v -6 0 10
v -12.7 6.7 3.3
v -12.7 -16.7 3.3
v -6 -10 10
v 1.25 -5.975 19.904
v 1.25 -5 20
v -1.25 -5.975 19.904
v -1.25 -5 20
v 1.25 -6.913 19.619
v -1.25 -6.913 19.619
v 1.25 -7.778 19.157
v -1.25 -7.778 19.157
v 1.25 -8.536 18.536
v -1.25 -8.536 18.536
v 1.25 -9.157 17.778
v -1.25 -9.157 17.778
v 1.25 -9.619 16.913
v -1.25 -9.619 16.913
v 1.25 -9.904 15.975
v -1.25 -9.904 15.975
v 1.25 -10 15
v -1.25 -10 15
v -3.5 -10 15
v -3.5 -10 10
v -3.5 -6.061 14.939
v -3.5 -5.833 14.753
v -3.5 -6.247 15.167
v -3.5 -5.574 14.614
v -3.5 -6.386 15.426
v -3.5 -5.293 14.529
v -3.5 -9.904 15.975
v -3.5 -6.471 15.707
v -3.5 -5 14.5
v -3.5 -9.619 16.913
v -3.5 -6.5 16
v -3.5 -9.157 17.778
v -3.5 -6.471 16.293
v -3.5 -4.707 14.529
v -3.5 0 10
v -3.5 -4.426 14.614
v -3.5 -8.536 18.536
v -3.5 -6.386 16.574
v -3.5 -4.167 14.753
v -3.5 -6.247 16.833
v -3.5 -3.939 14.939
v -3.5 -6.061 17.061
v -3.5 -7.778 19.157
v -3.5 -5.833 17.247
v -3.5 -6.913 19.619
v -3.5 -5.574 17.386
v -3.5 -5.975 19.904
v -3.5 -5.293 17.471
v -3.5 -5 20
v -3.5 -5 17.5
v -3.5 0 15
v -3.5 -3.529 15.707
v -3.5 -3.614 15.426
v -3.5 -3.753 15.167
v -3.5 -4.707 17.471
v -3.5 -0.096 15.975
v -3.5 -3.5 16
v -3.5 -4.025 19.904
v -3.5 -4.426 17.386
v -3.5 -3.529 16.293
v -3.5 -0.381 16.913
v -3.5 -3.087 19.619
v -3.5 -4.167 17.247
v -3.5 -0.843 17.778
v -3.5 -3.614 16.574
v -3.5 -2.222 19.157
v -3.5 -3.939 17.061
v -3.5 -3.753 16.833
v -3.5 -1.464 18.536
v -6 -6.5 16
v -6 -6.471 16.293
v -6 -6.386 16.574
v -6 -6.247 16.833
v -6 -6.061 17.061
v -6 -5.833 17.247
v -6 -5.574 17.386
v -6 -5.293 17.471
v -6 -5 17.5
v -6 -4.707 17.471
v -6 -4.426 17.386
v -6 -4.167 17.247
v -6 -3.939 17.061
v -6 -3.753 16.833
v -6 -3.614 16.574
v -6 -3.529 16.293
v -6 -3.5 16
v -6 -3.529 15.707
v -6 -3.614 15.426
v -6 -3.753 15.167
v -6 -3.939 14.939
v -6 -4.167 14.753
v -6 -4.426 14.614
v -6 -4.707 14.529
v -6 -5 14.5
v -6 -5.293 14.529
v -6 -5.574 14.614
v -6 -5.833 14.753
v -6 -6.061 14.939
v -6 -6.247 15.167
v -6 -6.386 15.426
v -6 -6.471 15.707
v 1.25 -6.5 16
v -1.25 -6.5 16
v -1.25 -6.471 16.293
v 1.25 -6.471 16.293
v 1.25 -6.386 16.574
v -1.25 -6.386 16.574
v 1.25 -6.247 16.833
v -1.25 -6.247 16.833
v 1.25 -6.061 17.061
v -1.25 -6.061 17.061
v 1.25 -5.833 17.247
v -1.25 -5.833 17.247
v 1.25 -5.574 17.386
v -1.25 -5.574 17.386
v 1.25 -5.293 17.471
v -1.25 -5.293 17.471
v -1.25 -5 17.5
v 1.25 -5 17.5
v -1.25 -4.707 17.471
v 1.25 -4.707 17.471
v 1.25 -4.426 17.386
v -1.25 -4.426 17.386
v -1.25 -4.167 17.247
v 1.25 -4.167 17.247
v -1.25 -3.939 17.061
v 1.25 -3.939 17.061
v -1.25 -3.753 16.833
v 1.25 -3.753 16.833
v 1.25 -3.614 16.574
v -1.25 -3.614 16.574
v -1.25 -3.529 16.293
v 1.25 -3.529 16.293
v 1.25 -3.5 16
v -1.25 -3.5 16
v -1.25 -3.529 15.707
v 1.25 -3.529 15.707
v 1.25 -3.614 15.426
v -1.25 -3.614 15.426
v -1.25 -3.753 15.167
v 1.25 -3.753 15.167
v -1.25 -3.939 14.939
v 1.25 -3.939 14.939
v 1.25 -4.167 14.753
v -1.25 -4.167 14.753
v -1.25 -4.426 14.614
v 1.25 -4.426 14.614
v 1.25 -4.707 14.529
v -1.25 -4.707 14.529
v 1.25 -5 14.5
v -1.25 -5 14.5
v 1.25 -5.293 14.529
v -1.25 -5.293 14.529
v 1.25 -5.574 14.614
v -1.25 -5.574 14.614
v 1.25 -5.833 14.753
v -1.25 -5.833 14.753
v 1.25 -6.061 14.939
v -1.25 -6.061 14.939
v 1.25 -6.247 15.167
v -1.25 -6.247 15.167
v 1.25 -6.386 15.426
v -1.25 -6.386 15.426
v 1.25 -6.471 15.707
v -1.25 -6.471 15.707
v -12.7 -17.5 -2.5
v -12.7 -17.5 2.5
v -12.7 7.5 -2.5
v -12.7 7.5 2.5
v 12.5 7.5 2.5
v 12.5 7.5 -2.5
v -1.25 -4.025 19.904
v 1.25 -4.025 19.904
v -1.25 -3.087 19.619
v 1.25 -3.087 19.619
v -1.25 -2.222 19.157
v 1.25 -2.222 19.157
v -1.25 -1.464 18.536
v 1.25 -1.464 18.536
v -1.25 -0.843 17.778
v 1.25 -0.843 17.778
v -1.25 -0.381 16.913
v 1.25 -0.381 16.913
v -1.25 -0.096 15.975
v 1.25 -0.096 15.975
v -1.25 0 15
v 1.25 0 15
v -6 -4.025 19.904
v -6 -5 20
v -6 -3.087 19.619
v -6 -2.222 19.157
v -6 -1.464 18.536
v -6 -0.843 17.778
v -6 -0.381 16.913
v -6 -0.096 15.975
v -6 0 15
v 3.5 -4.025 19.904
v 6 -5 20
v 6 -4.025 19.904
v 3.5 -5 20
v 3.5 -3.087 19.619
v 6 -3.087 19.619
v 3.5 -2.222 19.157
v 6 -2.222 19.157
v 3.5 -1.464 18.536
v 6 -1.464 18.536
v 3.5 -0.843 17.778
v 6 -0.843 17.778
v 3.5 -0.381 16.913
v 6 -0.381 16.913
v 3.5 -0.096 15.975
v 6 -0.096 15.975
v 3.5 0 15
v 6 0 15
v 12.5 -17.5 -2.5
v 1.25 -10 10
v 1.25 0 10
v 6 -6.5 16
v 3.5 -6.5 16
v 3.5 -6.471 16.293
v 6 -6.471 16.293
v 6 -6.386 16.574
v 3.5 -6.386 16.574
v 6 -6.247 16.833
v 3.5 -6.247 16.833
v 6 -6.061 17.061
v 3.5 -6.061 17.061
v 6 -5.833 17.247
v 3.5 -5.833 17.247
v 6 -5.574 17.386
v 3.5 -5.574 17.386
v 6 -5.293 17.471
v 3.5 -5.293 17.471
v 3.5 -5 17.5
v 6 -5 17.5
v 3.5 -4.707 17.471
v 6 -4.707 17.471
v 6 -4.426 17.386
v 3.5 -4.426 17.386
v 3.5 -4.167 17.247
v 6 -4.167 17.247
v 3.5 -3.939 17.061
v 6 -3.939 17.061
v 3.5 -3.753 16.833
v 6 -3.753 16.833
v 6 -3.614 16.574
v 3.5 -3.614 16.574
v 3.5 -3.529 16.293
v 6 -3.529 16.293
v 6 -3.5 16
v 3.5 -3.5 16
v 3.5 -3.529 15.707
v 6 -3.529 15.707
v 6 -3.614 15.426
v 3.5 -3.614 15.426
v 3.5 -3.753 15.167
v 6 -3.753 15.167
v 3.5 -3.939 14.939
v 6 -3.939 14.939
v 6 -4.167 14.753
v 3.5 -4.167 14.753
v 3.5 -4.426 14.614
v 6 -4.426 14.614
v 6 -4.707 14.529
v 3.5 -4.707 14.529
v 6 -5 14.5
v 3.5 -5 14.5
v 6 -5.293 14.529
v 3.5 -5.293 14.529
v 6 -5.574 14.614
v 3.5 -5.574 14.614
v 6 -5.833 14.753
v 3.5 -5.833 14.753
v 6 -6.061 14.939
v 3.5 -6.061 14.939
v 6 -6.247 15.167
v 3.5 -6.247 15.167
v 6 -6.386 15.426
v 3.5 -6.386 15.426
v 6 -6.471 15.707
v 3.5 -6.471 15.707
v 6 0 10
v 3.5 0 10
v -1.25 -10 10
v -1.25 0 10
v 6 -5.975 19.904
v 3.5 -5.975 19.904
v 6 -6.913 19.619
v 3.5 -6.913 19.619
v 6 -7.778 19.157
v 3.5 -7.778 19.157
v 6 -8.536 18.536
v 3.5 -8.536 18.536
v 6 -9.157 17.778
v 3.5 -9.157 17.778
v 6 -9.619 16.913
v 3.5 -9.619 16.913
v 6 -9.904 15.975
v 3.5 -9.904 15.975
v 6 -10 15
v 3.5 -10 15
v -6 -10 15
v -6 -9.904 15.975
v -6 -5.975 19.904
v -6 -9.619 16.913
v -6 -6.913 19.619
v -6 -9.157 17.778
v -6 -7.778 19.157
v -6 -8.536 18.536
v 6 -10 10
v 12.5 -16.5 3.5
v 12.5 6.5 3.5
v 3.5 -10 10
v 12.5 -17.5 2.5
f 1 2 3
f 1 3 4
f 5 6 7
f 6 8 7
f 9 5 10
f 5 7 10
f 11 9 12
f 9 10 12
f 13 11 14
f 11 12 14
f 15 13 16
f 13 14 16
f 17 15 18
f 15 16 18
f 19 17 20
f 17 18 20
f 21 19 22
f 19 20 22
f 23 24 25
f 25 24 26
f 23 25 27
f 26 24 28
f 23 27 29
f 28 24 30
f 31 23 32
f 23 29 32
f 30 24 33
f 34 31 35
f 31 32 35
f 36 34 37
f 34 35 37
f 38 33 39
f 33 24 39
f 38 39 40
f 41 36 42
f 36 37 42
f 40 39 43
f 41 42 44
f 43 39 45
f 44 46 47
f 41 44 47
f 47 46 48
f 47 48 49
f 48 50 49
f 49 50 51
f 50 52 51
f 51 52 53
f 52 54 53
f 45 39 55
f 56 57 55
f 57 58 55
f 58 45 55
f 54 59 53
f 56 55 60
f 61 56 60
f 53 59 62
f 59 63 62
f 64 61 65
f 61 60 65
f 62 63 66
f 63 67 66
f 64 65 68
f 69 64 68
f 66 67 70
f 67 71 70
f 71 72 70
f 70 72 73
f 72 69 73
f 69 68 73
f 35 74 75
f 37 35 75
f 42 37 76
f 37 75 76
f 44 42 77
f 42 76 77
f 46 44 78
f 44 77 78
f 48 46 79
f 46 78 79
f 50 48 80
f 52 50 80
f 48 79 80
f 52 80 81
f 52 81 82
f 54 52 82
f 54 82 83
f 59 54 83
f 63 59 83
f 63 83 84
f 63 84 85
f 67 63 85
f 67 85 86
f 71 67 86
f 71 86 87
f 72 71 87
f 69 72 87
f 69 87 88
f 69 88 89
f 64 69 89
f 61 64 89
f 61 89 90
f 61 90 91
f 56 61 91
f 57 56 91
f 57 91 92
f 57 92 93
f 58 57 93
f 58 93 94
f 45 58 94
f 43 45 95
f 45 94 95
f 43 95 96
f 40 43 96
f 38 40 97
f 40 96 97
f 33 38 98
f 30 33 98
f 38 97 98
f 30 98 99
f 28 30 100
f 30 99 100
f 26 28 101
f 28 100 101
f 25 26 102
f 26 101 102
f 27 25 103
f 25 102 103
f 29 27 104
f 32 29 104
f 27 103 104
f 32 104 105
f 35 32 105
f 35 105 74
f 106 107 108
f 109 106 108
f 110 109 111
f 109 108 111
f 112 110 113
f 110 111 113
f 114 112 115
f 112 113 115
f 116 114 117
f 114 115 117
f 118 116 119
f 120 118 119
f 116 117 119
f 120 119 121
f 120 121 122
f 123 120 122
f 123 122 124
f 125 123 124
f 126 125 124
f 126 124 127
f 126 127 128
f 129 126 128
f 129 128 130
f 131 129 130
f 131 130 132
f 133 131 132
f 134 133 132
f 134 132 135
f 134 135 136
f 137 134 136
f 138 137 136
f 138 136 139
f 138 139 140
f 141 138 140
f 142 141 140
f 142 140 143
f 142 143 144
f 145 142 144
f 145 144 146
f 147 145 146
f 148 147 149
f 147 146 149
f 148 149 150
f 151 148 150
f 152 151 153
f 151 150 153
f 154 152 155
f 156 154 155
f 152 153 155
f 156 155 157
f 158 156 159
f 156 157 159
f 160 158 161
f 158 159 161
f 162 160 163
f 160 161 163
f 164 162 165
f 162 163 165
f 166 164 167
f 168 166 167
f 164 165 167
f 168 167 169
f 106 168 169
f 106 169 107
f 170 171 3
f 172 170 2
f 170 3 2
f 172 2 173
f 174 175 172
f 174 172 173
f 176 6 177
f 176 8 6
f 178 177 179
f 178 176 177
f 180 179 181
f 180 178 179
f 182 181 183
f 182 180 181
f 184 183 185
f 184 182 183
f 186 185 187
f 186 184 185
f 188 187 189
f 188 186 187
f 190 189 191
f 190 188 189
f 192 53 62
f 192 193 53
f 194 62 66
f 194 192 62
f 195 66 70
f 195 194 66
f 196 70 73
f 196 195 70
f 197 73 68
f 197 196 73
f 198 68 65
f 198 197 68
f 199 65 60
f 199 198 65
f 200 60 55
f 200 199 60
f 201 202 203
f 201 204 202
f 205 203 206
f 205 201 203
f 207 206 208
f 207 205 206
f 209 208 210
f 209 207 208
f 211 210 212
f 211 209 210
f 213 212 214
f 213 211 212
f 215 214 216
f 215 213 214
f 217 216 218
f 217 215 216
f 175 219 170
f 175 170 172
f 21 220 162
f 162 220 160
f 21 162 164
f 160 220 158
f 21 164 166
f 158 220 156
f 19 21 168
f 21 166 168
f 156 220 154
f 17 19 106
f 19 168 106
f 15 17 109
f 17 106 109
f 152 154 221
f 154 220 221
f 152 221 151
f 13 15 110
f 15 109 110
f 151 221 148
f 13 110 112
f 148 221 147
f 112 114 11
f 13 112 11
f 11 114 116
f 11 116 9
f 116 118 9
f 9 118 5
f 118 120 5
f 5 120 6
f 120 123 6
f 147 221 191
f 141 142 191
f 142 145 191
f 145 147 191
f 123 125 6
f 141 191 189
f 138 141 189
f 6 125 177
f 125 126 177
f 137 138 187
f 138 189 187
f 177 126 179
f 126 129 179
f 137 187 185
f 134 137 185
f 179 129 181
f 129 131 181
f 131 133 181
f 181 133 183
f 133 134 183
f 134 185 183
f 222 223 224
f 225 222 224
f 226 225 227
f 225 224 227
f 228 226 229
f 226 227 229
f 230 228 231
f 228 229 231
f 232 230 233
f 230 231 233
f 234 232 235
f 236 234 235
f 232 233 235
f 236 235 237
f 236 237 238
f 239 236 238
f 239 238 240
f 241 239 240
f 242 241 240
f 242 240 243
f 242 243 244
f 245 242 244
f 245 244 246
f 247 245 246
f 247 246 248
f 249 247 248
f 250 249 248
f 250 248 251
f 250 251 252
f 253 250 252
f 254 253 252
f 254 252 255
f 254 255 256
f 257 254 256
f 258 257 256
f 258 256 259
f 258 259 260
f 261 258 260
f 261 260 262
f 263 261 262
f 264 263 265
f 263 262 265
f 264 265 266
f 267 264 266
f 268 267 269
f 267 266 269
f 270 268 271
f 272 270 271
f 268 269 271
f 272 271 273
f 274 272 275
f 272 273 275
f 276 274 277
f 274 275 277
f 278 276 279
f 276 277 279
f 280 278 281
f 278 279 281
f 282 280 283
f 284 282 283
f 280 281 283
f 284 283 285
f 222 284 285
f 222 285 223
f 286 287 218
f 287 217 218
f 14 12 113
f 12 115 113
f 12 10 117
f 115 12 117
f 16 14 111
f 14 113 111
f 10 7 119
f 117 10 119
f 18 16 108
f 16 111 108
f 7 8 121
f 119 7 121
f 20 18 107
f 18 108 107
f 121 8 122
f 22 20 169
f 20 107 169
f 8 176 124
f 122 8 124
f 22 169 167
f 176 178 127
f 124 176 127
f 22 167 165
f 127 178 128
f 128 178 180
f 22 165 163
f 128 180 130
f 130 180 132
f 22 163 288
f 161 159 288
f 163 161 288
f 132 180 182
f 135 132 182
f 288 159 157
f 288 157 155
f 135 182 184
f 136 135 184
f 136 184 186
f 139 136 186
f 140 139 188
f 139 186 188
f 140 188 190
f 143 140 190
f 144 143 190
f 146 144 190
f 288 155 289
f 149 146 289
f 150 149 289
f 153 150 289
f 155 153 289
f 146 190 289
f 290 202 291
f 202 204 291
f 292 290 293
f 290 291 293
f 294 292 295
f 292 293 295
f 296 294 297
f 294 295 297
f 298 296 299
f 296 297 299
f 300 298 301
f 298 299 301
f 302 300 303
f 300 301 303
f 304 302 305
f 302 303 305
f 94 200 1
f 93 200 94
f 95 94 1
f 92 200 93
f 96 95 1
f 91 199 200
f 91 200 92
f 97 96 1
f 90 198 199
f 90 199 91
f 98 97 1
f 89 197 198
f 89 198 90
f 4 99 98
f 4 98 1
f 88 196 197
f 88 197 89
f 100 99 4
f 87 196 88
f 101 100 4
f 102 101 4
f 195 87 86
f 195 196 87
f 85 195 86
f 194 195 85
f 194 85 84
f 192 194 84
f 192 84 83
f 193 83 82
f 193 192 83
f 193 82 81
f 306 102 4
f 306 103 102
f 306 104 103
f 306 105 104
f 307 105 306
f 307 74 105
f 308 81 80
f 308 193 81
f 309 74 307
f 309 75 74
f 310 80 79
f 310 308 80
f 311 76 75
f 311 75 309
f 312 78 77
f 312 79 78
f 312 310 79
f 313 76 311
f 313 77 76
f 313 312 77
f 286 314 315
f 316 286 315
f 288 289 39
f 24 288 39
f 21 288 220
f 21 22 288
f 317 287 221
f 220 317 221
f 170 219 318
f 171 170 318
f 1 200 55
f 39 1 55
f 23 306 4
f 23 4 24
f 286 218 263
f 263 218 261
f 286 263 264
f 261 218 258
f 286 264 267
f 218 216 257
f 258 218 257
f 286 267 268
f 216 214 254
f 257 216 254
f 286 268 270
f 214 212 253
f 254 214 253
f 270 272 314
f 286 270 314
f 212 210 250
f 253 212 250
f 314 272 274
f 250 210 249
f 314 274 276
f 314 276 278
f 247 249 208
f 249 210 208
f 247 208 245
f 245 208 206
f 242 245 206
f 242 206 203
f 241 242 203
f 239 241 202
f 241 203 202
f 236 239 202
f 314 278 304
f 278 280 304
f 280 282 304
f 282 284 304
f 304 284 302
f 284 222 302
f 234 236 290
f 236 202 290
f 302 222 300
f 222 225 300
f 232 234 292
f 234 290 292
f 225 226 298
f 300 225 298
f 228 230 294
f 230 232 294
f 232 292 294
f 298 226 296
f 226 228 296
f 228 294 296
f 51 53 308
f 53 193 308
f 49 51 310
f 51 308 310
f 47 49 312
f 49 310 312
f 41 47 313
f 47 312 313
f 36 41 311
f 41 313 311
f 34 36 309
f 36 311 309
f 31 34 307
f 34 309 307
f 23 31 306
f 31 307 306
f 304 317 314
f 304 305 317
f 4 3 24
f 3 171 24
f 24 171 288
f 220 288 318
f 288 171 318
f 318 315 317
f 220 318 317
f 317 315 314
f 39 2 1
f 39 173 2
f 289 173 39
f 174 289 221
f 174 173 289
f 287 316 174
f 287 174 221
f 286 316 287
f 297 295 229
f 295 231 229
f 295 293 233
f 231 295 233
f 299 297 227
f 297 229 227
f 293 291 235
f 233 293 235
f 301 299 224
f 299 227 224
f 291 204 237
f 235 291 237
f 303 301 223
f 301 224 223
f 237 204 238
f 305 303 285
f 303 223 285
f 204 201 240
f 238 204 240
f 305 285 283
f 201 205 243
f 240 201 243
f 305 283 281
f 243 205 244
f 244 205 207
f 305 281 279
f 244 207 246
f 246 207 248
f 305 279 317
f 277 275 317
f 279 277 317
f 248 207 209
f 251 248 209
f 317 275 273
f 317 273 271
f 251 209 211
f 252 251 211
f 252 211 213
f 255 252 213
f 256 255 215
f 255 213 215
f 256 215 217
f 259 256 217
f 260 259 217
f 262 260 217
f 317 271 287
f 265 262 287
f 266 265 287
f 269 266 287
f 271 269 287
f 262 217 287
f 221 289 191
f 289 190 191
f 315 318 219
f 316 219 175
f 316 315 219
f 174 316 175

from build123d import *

# Parameters (mm, degrees)
F1_DEPTH     = 10
F2_R         = 4.99999
F3_W         = 7.5
F3_H         = 5
F3_W_2       = 10
F4_DEPTH     = 25.2
F5_T1_DEPTH  = 12
F5_T6_DEPTH  = 10
F5_T11_DEPTH = 10
F5_T17_DEPTH = 29.2876224097
F5_T23_DEPTH = 31.2876224097
F5_T31_DEPTH = 29.2876224097
F5_T37_DEPTH = 31.2876224097
F5_T45_DEPTH = 29.2876224097
F5_T51_DEPTH = 31.2876224097
F5_T59_DEPTH = 31.2876224097
F5_T64_DEPTH = 29.2876224097
F6_R         = 1.5
F7_DEPTH     = 25


# Not quite as in the source:
# - a fillet or chamfer that OpenCascade refuses, or shapes differently, is made with other operations: its cross-section is extruded or revolved along the edge and cut away or added
# - a fillet or chamfer is up to 0.001 mm smaller than in the source, because OpenCascade refuses the exact size


with BuildPart() as f1:
    # F0 (on Front) → F1 (new body)
    with BuildSketch(Plane.XZ):
        Polygon((12.5, -2.5), (12.5, 2.5), (6, 2.5), (-6, 2.5), (-12.5, 2.5), (-12.5, -2.5), align=None)
        Polygon((-6, 2.5), (6, 2.5), (6, 10), (6, 20), (3.5, 20), (3.5, 10), (1.25, 10), (1.25, 20), (0, 20), (-1.25, 20), (-1.25, 10), (-3.5, 10), (-3.5, 20), (-6, 20), (-6, 10), align=None)
    extrude(amount=F1_DEPTH)

    # F2 (radius 5 in the source; OpenCascade refuses exactly that, so slightly less here)
    f2_edges = [f1.edges().sort_by_distance(p)[0] for p in [
        (-4.75, 0, 20),
        (0, 0, 20),
        (4.75, 0, 20),
        (-4.75, -10, 20),
        (0, -10, 20),
        (4.75, -10, 20),
    ]]
    fillet(f2_edges, radius=F2_R)

    # F3 (on face) → F4 (join)
    with BuildSketch(Plane.YZ.offset(12.5)):
        with Locations((-13.75, 0)):
            Rectangle(F3_W, F3_H)
        with Locations((3.75, 0)):
            Rectangle(F3_W, F3_H)
        with Locations((-5, 0)):
            Rectangle(F3_W_2, F3_H)
    extrude(amount=-F4_DEPTH)

    # F5: chamfer of 7.5 on 4 edges, made by hand

    # F5_s2 → F5_t1 (join)
    with BuildSketch(Plane.YZ.offset(-6)):
        Polygon((-17.5, 2.5), (-10, 10), (-10, 2.5), align=None)
        Polygon((7.5, 2.5), (0, 10), (0, 2.5), align=None)
    extrude(amount=F5_T1_DEPTH)


with BuildPart() as f5_tool4:
    # F5_s5 → F5_t6 (new body)
    with BuildSketch(Plane.XZ):
        Polygon((6, 10), (13.5, 2.5), (6, 2.5), align=None)
    extrude(amount=F5_T6_DEPTH)

    split(bisect_by=Plane.YZ.offset(12.5), keep=Keep.BOTTOM)


with BuildPart() as f1_1:
    add(f1.part)

    # F5_t3: union F5_tool4
    add(f5_tool4.part)


with BuildPart() as f5_tool9:
    # F5_s10 → F5_t11 (new body)
    with BuildSketch(Plane.XZ):
        Polygon((-13.5, 2.5), (-6, 10), (-6, 2.5), align=None)
    extrude(amount=F5_T11_DEPTH)

    split(bisect_by=Plane.YZ.offset(-12.7), keep=Keep.TOP)


with BuildPart() as f1_2:
    add(f1_1.part)

    # F5_t8: union F5_tool9
    add(f5_tool9.part)


with BuildPart() as f5_tool15:
    # F5_s16 → F5_t17 (new body)
    with BuildSketch(Plane.XZ):
        Polygon((6, 10), (13.5, 2.5), (6, 2.5), align=None)
    extrude(amount=F5_T17_DEPTH)

    split(bisect_by=Plane.XZ.offset(17.5), keep=Keep.BOTTOM)

    split(bisect_by=Plane.YZ.offset(12.5), keep=Keep.BOTTOM)

    split(bisect_by=Plane.XZ.offset(10), keep=Keep.TOP)


with BuildPart() as f5_tool21:
    # F5_s22 → F5_t23 (new body)
    with BuildSketch(Plane.YZ.offset(25.2876224097)):
        Polygon((-17.5, 2.5), (-10, 10), (-10, 2.5), align=None)
    extrude(amount=-F5_T23_DEPTH)

    split(bisect_by=Plane.YZ.offset(6), keep=Keep.TOP)

    split(bisect_by=Plane.YZ.offset(12.5), keep=Keep.BOTTOM)


with BuildPart() as f5_tool15_1:
    add(f5_tool15.part)

    # F5_t26: intersect F5_tool21
    add(f5_tool21.part, mode=Mode.INTERSECT)


with BuildPart() as f1_3:
    add(f1_2.part)

    # F5_t13: union F5_tool15
    add(f5_tool15_1.part)


with BuildPart() as f5_tool29:
    # F5_s30 → F5_t31 (new body)
    with BuildSketch(Plane.XZ):
        Polygon((-13.5, 2.5), (-6, 10), (-6, 2.5), align=None)
    extrude(amount=F5_T31_DEPTH)

    split(bisect_by=Plane.YZ.offset(-12.7), keep=Keep.TOP)

    split(bisect_by=Plane.XZ.offset(17.5), keep=Keep.BOTTOM)

    split(bisect_by=Plane.XZ.offset(10), keep=Keep.TOP)


with BuildPart() as f5_tool35:
    # F5_s36 → F5_t37 (new body)
    with BuildSketch(Plane.YZ.offset(6)):
        Polygon((-17.5, 2.5), (-10, 10), (-10, 2.5), align=None)
    extrude(amount=-F5_T37_DEPTH)

    split(bisect_by=Plane.YZ.offset(-6), keep=Keep.BOTTOM)

    split(bisect_by=Plane.YZ.offset(-12.7), keep=Keep.TOP)


with BuildPart() as f5_tool29_1:
    add(f5_tool29.part)

    # F5_t40: intersect F5_tool35
    add(f5_tool35.part, mode=Mode.INTERSECT)


with BuildPart() as f1_4:
    add(f1_3.part)

    # F5_t27: union F5_tool29
    add(f5_tool29_1.part)


with BuildPart() as f5_tool43:
    # F5_s44 → F5_t45 (new body)
    with BuildSketch(Plane.XZ.offset(-19.2876224097)):
        Polygon((6, 10), (13.5, 2.5), (6, 2.5), align=None)
    extrude(amount=F5_T45_DEPTH)

    split(bisect_by=Plane.XZ.offset(-7.5), keep=Keep.TOP)

    split(bisect_by=Plane.YZ.offset(12.5), keep=Keep.BOTTOM)

    split(bisect_by=Plane.XZ, keep=Keep.BOTTOM)


with BuildPart() as f5_tool49:
    # F5_s50 → F5_t51 (new body)
    with BuildSketch(Plane.YZ.offset(25.2876224097)):
        Polygon((7.5, 2.5), (0, 10), (0, 2.5), align=None)
    extrude(amount=-F5_T51_DEPTH)

    split(bisect_by=Plane.YZ.offset(6), keep=Keep.TOP)

    split(bisect_by=Plane.YZ.offset(12.5), keep=Keep.BOTTOM)


with BuildPart() as f5_tool43_1:
    add(f5_tool43.part)

    # F5_t54: intersect F5_tool49
    add(f5_tool49.part, mode=Mode.INTERSECT)


with BuildPart() as f1_5:
    add(f1_4.part)

    # F5_t41: union F5_tool43
    add(f5_tool43_1.part)


with BuildPart() as f5_tool57:
    # F5_s58 → F5_t59 (new body)
    with BuildSketch(Plane.YZ.offset(6)):
        Polygon((7.5, 2.5), (0, 10), (0, 2.5), align=None)
    extrude(amount=-F5_T59_DEPTH)

    split(bisect_by=Plane.YZ.offset(-6), keep=Keep.BOTTOM)

    split(bisect_by=Plane.YZ.offset(-12.7), keep=Keep.TOP)


with BuildPart() as f5_tool62:
    # F5_s63 → F5_t64 (new body)
    with BuildSketch(Plane.XZ.offset(-19.2876224097)):
        Polygon((-13.5, 2.5), (-6, 10), (-6, 2.5), align=None)
    extrude(amount=F5_T64_DEPTH)

    split(bisect_by=Plane.XZ.offset(-7.5), keep=Keep.TOP)

    split(bisect_by=Plane.YZ.offset(-12.7), keep=Keep.TOP)

    split(bisect_by=Plane.XZ, keep=Keep.BOTTOM)


with BuildPart() as f5_tool57_1:
    add(f5_tool57.part)

    # F5_t68: intersect F5_tool62
    add(f5_tool62.part, mode=Mode.INTERSECT)


with BuildPart() as f1_6:
    add(f1_5.part)

    # F5_t55: union F5_tool57
    add(f5_tool57_1.part)

    # F6 (on face) → F7 (cut)
    with BuildSketch(Plane(origin=(-6, 0, 0), x_dir=(0, -1, 0), z_dir=(-1, 0, 0))):
        with Locations((5, 16)):
            Circle(F6_R)
    extrude(amount=-F7_DEPTH, mode=Mode.SUBTRACT)


solid = f1_6.part
